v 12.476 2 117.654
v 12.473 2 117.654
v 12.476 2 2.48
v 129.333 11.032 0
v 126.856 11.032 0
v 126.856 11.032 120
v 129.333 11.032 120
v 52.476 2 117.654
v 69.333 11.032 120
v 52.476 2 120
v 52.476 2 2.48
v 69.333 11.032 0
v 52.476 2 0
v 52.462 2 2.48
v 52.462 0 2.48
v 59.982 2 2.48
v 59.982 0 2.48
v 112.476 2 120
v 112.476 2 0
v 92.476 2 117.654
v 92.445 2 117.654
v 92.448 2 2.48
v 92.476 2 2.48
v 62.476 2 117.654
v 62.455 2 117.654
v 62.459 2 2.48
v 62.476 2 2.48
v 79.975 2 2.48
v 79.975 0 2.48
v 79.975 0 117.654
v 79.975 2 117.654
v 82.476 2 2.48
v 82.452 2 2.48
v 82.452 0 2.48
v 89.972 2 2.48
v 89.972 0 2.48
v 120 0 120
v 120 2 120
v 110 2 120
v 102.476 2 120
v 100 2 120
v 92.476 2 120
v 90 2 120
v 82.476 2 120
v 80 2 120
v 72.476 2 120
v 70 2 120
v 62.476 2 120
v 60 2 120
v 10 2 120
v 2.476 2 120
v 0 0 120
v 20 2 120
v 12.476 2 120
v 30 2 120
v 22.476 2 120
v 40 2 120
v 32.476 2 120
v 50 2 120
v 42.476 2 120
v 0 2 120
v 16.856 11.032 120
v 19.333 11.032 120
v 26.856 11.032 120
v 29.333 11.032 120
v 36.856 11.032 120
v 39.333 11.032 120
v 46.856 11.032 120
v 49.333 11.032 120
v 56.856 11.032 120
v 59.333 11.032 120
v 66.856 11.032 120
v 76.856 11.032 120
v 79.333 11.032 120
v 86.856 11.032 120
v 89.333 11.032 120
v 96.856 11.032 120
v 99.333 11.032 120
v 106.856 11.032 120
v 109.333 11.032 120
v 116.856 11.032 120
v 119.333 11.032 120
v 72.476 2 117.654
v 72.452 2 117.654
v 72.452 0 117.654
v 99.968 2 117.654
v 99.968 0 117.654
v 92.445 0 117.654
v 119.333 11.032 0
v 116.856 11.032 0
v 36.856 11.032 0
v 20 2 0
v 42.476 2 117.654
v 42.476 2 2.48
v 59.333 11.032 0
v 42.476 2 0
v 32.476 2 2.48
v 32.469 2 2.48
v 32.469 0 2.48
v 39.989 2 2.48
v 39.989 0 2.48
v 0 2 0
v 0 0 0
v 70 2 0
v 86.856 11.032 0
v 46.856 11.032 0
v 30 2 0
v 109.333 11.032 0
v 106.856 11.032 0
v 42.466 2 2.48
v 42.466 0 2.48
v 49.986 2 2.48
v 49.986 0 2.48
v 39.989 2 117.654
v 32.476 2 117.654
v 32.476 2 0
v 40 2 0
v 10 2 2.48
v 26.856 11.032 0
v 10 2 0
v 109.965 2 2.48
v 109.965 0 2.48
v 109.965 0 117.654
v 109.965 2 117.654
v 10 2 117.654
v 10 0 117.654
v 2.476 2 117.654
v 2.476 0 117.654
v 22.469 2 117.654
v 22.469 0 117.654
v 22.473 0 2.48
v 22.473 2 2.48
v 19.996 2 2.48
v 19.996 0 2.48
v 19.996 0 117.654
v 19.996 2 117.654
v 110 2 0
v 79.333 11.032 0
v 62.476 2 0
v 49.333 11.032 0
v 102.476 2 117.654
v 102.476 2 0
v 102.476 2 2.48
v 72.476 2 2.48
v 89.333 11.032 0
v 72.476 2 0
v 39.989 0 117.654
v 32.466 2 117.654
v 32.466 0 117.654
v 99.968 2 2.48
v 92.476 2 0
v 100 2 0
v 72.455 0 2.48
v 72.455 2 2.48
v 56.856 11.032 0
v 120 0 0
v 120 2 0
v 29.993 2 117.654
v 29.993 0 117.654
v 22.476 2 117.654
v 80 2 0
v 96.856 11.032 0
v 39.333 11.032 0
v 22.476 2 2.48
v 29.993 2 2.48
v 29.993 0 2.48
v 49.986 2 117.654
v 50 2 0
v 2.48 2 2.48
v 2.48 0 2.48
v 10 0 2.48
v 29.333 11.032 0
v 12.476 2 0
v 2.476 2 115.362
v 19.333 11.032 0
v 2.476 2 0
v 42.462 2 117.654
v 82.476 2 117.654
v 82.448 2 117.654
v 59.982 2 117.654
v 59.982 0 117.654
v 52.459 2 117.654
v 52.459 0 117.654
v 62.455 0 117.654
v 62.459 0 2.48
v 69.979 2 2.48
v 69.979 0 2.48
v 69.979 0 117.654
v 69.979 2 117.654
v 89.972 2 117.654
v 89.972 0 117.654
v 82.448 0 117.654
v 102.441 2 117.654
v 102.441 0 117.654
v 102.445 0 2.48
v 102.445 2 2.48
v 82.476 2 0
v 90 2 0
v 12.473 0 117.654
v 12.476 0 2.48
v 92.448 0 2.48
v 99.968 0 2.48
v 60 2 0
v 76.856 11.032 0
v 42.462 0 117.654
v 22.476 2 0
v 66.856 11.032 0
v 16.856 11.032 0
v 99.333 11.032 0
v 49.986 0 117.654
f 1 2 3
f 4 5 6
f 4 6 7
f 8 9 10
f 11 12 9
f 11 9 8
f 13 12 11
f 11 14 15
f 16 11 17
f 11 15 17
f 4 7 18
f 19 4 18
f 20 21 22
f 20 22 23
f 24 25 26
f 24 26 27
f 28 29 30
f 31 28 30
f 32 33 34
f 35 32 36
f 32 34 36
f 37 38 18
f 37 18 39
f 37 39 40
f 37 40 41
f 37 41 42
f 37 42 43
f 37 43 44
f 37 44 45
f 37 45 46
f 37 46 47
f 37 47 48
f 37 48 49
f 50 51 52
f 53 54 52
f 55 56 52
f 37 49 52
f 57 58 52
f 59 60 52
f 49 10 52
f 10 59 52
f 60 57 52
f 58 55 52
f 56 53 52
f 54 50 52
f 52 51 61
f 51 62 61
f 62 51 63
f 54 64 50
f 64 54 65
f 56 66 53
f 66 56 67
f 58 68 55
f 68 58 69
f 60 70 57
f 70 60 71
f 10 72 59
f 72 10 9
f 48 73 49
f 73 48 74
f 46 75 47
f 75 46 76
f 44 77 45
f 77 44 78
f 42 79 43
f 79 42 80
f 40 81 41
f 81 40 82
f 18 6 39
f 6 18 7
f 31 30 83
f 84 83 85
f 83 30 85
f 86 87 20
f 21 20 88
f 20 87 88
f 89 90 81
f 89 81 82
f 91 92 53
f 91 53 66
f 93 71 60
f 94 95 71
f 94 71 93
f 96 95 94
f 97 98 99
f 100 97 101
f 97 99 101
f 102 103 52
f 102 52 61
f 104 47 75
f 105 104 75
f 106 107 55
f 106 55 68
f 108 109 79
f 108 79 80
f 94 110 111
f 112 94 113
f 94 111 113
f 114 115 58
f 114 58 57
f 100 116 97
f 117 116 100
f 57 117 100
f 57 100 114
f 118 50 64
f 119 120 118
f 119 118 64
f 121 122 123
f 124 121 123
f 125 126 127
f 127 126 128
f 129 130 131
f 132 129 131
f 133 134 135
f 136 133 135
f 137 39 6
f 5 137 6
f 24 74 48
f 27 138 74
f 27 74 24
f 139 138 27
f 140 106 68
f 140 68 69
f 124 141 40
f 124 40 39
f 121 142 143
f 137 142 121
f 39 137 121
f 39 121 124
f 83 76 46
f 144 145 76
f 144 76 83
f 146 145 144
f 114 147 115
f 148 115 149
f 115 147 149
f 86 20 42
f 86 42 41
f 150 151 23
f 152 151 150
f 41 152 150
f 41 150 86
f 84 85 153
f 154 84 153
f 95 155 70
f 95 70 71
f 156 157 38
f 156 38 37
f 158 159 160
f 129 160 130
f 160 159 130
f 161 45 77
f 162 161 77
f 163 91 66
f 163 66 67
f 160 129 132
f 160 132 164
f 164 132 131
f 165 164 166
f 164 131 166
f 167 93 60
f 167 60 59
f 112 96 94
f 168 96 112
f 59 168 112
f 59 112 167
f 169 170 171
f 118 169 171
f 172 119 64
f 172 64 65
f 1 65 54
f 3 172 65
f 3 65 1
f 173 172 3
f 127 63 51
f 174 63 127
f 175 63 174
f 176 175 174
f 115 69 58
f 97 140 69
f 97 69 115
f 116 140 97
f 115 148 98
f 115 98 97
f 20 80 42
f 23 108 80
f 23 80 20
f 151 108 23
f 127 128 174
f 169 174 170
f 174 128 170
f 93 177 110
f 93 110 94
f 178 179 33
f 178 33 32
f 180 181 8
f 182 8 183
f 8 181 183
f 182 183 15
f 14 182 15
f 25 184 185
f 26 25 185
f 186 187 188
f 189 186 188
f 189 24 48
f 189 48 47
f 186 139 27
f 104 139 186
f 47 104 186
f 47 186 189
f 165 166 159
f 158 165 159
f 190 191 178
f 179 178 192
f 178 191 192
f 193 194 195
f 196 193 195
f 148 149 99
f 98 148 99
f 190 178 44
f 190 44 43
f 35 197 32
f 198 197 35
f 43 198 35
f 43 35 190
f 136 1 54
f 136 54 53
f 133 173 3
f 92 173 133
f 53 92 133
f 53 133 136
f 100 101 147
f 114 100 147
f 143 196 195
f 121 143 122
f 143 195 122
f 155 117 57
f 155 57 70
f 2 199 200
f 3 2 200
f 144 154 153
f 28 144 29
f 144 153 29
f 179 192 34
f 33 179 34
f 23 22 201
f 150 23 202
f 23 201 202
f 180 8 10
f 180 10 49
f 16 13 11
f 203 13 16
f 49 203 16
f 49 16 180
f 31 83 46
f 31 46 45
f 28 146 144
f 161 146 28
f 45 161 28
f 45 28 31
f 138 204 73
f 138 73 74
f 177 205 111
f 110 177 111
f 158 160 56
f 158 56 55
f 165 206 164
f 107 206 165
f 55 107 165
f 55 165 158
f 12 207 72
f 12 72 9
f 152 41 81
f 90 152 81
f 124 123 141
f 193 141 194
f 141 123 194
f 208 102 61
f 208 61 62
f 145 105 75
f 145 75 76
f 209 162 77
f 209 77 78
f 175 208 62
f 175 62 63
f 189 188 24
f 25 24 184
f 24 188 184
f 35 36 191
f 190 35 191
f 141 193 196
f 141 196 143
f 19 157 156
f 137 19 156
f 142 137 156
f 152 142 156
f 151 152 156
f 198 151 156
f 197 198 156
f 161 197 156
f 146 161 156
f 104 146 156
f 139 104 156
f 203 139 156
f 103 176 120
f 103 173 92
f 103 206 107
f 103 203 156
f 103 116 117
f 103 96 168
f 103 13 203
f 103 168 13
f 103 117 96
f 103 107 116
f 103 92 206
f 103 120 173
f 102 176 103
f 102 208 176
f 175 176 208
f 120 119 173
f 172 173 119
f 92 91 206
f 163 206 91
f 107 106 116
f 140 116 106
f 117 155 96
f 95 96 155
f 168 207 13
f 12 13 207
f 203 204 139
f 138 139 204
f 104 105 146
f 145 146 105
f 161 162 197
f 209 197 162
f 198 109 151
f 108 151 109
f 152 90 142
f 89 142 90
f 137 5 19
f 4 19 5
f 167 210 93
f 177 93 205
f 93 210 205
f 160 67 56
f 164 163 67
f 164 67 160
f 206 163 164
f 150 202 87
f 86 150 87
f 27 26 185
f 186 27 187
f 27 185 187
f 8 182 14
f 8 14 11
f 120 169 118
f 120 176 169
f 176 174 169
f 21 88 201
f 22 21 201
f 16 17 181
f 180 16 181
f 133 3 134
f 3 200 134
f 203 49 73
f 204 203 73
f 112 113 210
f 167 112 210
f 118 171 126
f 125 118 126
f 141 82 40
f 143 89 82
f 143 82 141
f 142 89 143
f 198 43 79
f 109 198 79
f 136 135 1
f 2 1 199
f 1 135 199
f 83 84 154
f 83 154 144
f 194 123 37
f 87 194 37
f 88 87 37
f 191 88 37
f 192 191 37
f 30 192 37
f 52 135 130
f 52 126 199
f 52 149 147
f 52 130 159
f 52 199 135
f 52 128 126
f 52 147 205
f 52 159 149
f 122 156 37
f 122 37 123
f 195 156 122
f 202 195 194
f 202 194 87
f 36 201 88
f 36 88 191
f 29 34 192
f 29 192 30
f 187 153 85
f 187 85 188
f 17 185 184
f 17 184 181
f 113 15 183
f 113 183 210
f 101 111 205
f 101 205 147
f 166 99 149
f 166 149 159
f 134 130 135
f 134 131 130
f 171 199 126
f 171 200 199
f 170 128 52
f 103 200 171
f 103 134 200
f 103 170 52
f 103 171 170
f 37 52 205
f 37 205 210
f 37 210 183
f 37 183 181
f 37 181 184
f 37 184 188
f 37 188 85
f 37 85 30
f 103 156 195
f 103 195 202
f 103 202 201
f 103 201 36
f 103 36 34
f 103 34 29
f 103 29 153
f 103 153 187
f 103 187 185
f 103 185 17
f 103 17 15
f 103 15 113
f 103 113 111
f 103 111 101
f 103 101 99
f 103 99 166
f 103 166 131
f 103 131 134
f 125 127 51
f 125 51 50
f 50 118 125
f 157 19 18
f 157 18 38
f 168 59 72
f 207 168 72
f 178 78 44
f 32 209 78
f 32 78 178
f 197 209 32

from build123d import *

# Parameters (mm, degrees)
EXTRUDE_1_DEPTH     = 120
CUT_EXTRUDE_1_DEPTH = 2


with BuildPart() as part:
    # 草图2 → 凸台-拉伸1 (new body)
    with BuildSketch(Plane.XY):
        Polygon((0, 2), (16.856230065, 11.032475858), (19.332704549, 11.032475858), (2.476474484, 2), (10, 2), (26.856230065, 11.032475858), (29.332704549, 11.032475858), (12.476474484, 2), (20, 2), (36.856230065, 11.032475858), (39.332704549, 11.032475858), (22.476474484, 2), (30, 2), (46.856230065, 11.032475858), (49.332704549, 11.032475858), (32.476474484, 2), (40, 2), (56.856230065, 11.032475858), (59.332704549, 11.032475858), (42.476474484, 2), (50, 2), (66.856230065, 11.032475858), (69.332704549, 11.032475858), (52.476474484, 2), (60, 2), (76.856230065, 11.032475858), (79.332704549, 11.032475858), (62.476474484, 2), (70, 2), (86.856230065, 11.032475858), (89.332704549, 11.032475858), (72.476474484, 2), (80, 2), (96.856230065, 11.032475858), (99.332704549, 11.032475858), (82.476474484, 2), (90, 2), (106.856230065, 11.032475858), (109.332704549, 11.032475858), (92.476474484, 2), (100, 2), (116.856230065, 11.032475858), (119.332704549, 11.032475858), (102.476474484, 2), (110, 2), (126.856230065, 11.032475858), (129.332704549, 11.032475858), (112.476474484, 2), (120, 2), (120, 0), (0, 0), align=None)
    extrude(amount=EXTRUDE_1_DEPTH)

    # 草图5 → 切除-拉伸1 (cut)
    with BuildSketch(Plane.XZ):
        Polygon((2.476402921, 117.653523678), (2.48, 2.48), (10, 2.48), (9.999928921, 117.653523678), align=None)
        Polygon((19.996402921, 117.653523678), (12.472876921, 117.653523678), (12.476474, 2.48), (19.774552048, 2.48), (19.996474, 2.48), align=None)
        Polygon((32.465824921, 117.653523678), (32.469422, 2.48), (39.323656144, 2.48), (39.989422, 2.48), (39.989350921, 117.653523678), align=None)
        Polygon((42.462298921, 117.653523678), (42.465896, 2.48), (49.098208192, 2.48), (49.985896, 2.48), (49.985824921, 117.653523678), align=None)
        Polygon((52.458772921, 117.653523678), (52.46237, 2.48), (58.87276024, 2.48), (59.98237, 2.48), (59.982298921, 117.653523678), align=None)
        Polygon((62.455246921, 117.653523678), (62.458844, 2.48), (68.647312287, 2.48), (69.978844, 2.48), (69.978772921, 117.653523678), align=None)
        Polygon((72.451720921, 117.653523678), (72.455318, 2.48), (78.421864335, 2.48), (79.975318, 2.48), (79.975246921, 117.653523678), align=None)
        Polygon((82.448194921, 117.653523678), (82.451792, 2.48), (88.196416383, 2.48), (89.971792, 2.48), (89.971720921, 117.653523678), align=None)
        Polygon((92.444668921, 117.653523678), (92.448266, 2.48), (97.970968431, 2.48), (99.968266, 2.48), (99.968194921, 117.653523678), align=None)
        Polygon((102.441142921, 117.653523678), (102.44474, 2.48), (107.745520479, 2.48), (109.96474, 2.48), (109.964668921, 117.653523678), align=None)
        Polygon((22.469350921, 117.653523678), (22.472948, 2.48), (29.992948, 2.48), (29.992876921, 117.653523678), align=None)
    extrude(amount=-CUT_EXTRUDE_1_DEPTH, mode=Mode.SUBTRACT)


solid = part.part
